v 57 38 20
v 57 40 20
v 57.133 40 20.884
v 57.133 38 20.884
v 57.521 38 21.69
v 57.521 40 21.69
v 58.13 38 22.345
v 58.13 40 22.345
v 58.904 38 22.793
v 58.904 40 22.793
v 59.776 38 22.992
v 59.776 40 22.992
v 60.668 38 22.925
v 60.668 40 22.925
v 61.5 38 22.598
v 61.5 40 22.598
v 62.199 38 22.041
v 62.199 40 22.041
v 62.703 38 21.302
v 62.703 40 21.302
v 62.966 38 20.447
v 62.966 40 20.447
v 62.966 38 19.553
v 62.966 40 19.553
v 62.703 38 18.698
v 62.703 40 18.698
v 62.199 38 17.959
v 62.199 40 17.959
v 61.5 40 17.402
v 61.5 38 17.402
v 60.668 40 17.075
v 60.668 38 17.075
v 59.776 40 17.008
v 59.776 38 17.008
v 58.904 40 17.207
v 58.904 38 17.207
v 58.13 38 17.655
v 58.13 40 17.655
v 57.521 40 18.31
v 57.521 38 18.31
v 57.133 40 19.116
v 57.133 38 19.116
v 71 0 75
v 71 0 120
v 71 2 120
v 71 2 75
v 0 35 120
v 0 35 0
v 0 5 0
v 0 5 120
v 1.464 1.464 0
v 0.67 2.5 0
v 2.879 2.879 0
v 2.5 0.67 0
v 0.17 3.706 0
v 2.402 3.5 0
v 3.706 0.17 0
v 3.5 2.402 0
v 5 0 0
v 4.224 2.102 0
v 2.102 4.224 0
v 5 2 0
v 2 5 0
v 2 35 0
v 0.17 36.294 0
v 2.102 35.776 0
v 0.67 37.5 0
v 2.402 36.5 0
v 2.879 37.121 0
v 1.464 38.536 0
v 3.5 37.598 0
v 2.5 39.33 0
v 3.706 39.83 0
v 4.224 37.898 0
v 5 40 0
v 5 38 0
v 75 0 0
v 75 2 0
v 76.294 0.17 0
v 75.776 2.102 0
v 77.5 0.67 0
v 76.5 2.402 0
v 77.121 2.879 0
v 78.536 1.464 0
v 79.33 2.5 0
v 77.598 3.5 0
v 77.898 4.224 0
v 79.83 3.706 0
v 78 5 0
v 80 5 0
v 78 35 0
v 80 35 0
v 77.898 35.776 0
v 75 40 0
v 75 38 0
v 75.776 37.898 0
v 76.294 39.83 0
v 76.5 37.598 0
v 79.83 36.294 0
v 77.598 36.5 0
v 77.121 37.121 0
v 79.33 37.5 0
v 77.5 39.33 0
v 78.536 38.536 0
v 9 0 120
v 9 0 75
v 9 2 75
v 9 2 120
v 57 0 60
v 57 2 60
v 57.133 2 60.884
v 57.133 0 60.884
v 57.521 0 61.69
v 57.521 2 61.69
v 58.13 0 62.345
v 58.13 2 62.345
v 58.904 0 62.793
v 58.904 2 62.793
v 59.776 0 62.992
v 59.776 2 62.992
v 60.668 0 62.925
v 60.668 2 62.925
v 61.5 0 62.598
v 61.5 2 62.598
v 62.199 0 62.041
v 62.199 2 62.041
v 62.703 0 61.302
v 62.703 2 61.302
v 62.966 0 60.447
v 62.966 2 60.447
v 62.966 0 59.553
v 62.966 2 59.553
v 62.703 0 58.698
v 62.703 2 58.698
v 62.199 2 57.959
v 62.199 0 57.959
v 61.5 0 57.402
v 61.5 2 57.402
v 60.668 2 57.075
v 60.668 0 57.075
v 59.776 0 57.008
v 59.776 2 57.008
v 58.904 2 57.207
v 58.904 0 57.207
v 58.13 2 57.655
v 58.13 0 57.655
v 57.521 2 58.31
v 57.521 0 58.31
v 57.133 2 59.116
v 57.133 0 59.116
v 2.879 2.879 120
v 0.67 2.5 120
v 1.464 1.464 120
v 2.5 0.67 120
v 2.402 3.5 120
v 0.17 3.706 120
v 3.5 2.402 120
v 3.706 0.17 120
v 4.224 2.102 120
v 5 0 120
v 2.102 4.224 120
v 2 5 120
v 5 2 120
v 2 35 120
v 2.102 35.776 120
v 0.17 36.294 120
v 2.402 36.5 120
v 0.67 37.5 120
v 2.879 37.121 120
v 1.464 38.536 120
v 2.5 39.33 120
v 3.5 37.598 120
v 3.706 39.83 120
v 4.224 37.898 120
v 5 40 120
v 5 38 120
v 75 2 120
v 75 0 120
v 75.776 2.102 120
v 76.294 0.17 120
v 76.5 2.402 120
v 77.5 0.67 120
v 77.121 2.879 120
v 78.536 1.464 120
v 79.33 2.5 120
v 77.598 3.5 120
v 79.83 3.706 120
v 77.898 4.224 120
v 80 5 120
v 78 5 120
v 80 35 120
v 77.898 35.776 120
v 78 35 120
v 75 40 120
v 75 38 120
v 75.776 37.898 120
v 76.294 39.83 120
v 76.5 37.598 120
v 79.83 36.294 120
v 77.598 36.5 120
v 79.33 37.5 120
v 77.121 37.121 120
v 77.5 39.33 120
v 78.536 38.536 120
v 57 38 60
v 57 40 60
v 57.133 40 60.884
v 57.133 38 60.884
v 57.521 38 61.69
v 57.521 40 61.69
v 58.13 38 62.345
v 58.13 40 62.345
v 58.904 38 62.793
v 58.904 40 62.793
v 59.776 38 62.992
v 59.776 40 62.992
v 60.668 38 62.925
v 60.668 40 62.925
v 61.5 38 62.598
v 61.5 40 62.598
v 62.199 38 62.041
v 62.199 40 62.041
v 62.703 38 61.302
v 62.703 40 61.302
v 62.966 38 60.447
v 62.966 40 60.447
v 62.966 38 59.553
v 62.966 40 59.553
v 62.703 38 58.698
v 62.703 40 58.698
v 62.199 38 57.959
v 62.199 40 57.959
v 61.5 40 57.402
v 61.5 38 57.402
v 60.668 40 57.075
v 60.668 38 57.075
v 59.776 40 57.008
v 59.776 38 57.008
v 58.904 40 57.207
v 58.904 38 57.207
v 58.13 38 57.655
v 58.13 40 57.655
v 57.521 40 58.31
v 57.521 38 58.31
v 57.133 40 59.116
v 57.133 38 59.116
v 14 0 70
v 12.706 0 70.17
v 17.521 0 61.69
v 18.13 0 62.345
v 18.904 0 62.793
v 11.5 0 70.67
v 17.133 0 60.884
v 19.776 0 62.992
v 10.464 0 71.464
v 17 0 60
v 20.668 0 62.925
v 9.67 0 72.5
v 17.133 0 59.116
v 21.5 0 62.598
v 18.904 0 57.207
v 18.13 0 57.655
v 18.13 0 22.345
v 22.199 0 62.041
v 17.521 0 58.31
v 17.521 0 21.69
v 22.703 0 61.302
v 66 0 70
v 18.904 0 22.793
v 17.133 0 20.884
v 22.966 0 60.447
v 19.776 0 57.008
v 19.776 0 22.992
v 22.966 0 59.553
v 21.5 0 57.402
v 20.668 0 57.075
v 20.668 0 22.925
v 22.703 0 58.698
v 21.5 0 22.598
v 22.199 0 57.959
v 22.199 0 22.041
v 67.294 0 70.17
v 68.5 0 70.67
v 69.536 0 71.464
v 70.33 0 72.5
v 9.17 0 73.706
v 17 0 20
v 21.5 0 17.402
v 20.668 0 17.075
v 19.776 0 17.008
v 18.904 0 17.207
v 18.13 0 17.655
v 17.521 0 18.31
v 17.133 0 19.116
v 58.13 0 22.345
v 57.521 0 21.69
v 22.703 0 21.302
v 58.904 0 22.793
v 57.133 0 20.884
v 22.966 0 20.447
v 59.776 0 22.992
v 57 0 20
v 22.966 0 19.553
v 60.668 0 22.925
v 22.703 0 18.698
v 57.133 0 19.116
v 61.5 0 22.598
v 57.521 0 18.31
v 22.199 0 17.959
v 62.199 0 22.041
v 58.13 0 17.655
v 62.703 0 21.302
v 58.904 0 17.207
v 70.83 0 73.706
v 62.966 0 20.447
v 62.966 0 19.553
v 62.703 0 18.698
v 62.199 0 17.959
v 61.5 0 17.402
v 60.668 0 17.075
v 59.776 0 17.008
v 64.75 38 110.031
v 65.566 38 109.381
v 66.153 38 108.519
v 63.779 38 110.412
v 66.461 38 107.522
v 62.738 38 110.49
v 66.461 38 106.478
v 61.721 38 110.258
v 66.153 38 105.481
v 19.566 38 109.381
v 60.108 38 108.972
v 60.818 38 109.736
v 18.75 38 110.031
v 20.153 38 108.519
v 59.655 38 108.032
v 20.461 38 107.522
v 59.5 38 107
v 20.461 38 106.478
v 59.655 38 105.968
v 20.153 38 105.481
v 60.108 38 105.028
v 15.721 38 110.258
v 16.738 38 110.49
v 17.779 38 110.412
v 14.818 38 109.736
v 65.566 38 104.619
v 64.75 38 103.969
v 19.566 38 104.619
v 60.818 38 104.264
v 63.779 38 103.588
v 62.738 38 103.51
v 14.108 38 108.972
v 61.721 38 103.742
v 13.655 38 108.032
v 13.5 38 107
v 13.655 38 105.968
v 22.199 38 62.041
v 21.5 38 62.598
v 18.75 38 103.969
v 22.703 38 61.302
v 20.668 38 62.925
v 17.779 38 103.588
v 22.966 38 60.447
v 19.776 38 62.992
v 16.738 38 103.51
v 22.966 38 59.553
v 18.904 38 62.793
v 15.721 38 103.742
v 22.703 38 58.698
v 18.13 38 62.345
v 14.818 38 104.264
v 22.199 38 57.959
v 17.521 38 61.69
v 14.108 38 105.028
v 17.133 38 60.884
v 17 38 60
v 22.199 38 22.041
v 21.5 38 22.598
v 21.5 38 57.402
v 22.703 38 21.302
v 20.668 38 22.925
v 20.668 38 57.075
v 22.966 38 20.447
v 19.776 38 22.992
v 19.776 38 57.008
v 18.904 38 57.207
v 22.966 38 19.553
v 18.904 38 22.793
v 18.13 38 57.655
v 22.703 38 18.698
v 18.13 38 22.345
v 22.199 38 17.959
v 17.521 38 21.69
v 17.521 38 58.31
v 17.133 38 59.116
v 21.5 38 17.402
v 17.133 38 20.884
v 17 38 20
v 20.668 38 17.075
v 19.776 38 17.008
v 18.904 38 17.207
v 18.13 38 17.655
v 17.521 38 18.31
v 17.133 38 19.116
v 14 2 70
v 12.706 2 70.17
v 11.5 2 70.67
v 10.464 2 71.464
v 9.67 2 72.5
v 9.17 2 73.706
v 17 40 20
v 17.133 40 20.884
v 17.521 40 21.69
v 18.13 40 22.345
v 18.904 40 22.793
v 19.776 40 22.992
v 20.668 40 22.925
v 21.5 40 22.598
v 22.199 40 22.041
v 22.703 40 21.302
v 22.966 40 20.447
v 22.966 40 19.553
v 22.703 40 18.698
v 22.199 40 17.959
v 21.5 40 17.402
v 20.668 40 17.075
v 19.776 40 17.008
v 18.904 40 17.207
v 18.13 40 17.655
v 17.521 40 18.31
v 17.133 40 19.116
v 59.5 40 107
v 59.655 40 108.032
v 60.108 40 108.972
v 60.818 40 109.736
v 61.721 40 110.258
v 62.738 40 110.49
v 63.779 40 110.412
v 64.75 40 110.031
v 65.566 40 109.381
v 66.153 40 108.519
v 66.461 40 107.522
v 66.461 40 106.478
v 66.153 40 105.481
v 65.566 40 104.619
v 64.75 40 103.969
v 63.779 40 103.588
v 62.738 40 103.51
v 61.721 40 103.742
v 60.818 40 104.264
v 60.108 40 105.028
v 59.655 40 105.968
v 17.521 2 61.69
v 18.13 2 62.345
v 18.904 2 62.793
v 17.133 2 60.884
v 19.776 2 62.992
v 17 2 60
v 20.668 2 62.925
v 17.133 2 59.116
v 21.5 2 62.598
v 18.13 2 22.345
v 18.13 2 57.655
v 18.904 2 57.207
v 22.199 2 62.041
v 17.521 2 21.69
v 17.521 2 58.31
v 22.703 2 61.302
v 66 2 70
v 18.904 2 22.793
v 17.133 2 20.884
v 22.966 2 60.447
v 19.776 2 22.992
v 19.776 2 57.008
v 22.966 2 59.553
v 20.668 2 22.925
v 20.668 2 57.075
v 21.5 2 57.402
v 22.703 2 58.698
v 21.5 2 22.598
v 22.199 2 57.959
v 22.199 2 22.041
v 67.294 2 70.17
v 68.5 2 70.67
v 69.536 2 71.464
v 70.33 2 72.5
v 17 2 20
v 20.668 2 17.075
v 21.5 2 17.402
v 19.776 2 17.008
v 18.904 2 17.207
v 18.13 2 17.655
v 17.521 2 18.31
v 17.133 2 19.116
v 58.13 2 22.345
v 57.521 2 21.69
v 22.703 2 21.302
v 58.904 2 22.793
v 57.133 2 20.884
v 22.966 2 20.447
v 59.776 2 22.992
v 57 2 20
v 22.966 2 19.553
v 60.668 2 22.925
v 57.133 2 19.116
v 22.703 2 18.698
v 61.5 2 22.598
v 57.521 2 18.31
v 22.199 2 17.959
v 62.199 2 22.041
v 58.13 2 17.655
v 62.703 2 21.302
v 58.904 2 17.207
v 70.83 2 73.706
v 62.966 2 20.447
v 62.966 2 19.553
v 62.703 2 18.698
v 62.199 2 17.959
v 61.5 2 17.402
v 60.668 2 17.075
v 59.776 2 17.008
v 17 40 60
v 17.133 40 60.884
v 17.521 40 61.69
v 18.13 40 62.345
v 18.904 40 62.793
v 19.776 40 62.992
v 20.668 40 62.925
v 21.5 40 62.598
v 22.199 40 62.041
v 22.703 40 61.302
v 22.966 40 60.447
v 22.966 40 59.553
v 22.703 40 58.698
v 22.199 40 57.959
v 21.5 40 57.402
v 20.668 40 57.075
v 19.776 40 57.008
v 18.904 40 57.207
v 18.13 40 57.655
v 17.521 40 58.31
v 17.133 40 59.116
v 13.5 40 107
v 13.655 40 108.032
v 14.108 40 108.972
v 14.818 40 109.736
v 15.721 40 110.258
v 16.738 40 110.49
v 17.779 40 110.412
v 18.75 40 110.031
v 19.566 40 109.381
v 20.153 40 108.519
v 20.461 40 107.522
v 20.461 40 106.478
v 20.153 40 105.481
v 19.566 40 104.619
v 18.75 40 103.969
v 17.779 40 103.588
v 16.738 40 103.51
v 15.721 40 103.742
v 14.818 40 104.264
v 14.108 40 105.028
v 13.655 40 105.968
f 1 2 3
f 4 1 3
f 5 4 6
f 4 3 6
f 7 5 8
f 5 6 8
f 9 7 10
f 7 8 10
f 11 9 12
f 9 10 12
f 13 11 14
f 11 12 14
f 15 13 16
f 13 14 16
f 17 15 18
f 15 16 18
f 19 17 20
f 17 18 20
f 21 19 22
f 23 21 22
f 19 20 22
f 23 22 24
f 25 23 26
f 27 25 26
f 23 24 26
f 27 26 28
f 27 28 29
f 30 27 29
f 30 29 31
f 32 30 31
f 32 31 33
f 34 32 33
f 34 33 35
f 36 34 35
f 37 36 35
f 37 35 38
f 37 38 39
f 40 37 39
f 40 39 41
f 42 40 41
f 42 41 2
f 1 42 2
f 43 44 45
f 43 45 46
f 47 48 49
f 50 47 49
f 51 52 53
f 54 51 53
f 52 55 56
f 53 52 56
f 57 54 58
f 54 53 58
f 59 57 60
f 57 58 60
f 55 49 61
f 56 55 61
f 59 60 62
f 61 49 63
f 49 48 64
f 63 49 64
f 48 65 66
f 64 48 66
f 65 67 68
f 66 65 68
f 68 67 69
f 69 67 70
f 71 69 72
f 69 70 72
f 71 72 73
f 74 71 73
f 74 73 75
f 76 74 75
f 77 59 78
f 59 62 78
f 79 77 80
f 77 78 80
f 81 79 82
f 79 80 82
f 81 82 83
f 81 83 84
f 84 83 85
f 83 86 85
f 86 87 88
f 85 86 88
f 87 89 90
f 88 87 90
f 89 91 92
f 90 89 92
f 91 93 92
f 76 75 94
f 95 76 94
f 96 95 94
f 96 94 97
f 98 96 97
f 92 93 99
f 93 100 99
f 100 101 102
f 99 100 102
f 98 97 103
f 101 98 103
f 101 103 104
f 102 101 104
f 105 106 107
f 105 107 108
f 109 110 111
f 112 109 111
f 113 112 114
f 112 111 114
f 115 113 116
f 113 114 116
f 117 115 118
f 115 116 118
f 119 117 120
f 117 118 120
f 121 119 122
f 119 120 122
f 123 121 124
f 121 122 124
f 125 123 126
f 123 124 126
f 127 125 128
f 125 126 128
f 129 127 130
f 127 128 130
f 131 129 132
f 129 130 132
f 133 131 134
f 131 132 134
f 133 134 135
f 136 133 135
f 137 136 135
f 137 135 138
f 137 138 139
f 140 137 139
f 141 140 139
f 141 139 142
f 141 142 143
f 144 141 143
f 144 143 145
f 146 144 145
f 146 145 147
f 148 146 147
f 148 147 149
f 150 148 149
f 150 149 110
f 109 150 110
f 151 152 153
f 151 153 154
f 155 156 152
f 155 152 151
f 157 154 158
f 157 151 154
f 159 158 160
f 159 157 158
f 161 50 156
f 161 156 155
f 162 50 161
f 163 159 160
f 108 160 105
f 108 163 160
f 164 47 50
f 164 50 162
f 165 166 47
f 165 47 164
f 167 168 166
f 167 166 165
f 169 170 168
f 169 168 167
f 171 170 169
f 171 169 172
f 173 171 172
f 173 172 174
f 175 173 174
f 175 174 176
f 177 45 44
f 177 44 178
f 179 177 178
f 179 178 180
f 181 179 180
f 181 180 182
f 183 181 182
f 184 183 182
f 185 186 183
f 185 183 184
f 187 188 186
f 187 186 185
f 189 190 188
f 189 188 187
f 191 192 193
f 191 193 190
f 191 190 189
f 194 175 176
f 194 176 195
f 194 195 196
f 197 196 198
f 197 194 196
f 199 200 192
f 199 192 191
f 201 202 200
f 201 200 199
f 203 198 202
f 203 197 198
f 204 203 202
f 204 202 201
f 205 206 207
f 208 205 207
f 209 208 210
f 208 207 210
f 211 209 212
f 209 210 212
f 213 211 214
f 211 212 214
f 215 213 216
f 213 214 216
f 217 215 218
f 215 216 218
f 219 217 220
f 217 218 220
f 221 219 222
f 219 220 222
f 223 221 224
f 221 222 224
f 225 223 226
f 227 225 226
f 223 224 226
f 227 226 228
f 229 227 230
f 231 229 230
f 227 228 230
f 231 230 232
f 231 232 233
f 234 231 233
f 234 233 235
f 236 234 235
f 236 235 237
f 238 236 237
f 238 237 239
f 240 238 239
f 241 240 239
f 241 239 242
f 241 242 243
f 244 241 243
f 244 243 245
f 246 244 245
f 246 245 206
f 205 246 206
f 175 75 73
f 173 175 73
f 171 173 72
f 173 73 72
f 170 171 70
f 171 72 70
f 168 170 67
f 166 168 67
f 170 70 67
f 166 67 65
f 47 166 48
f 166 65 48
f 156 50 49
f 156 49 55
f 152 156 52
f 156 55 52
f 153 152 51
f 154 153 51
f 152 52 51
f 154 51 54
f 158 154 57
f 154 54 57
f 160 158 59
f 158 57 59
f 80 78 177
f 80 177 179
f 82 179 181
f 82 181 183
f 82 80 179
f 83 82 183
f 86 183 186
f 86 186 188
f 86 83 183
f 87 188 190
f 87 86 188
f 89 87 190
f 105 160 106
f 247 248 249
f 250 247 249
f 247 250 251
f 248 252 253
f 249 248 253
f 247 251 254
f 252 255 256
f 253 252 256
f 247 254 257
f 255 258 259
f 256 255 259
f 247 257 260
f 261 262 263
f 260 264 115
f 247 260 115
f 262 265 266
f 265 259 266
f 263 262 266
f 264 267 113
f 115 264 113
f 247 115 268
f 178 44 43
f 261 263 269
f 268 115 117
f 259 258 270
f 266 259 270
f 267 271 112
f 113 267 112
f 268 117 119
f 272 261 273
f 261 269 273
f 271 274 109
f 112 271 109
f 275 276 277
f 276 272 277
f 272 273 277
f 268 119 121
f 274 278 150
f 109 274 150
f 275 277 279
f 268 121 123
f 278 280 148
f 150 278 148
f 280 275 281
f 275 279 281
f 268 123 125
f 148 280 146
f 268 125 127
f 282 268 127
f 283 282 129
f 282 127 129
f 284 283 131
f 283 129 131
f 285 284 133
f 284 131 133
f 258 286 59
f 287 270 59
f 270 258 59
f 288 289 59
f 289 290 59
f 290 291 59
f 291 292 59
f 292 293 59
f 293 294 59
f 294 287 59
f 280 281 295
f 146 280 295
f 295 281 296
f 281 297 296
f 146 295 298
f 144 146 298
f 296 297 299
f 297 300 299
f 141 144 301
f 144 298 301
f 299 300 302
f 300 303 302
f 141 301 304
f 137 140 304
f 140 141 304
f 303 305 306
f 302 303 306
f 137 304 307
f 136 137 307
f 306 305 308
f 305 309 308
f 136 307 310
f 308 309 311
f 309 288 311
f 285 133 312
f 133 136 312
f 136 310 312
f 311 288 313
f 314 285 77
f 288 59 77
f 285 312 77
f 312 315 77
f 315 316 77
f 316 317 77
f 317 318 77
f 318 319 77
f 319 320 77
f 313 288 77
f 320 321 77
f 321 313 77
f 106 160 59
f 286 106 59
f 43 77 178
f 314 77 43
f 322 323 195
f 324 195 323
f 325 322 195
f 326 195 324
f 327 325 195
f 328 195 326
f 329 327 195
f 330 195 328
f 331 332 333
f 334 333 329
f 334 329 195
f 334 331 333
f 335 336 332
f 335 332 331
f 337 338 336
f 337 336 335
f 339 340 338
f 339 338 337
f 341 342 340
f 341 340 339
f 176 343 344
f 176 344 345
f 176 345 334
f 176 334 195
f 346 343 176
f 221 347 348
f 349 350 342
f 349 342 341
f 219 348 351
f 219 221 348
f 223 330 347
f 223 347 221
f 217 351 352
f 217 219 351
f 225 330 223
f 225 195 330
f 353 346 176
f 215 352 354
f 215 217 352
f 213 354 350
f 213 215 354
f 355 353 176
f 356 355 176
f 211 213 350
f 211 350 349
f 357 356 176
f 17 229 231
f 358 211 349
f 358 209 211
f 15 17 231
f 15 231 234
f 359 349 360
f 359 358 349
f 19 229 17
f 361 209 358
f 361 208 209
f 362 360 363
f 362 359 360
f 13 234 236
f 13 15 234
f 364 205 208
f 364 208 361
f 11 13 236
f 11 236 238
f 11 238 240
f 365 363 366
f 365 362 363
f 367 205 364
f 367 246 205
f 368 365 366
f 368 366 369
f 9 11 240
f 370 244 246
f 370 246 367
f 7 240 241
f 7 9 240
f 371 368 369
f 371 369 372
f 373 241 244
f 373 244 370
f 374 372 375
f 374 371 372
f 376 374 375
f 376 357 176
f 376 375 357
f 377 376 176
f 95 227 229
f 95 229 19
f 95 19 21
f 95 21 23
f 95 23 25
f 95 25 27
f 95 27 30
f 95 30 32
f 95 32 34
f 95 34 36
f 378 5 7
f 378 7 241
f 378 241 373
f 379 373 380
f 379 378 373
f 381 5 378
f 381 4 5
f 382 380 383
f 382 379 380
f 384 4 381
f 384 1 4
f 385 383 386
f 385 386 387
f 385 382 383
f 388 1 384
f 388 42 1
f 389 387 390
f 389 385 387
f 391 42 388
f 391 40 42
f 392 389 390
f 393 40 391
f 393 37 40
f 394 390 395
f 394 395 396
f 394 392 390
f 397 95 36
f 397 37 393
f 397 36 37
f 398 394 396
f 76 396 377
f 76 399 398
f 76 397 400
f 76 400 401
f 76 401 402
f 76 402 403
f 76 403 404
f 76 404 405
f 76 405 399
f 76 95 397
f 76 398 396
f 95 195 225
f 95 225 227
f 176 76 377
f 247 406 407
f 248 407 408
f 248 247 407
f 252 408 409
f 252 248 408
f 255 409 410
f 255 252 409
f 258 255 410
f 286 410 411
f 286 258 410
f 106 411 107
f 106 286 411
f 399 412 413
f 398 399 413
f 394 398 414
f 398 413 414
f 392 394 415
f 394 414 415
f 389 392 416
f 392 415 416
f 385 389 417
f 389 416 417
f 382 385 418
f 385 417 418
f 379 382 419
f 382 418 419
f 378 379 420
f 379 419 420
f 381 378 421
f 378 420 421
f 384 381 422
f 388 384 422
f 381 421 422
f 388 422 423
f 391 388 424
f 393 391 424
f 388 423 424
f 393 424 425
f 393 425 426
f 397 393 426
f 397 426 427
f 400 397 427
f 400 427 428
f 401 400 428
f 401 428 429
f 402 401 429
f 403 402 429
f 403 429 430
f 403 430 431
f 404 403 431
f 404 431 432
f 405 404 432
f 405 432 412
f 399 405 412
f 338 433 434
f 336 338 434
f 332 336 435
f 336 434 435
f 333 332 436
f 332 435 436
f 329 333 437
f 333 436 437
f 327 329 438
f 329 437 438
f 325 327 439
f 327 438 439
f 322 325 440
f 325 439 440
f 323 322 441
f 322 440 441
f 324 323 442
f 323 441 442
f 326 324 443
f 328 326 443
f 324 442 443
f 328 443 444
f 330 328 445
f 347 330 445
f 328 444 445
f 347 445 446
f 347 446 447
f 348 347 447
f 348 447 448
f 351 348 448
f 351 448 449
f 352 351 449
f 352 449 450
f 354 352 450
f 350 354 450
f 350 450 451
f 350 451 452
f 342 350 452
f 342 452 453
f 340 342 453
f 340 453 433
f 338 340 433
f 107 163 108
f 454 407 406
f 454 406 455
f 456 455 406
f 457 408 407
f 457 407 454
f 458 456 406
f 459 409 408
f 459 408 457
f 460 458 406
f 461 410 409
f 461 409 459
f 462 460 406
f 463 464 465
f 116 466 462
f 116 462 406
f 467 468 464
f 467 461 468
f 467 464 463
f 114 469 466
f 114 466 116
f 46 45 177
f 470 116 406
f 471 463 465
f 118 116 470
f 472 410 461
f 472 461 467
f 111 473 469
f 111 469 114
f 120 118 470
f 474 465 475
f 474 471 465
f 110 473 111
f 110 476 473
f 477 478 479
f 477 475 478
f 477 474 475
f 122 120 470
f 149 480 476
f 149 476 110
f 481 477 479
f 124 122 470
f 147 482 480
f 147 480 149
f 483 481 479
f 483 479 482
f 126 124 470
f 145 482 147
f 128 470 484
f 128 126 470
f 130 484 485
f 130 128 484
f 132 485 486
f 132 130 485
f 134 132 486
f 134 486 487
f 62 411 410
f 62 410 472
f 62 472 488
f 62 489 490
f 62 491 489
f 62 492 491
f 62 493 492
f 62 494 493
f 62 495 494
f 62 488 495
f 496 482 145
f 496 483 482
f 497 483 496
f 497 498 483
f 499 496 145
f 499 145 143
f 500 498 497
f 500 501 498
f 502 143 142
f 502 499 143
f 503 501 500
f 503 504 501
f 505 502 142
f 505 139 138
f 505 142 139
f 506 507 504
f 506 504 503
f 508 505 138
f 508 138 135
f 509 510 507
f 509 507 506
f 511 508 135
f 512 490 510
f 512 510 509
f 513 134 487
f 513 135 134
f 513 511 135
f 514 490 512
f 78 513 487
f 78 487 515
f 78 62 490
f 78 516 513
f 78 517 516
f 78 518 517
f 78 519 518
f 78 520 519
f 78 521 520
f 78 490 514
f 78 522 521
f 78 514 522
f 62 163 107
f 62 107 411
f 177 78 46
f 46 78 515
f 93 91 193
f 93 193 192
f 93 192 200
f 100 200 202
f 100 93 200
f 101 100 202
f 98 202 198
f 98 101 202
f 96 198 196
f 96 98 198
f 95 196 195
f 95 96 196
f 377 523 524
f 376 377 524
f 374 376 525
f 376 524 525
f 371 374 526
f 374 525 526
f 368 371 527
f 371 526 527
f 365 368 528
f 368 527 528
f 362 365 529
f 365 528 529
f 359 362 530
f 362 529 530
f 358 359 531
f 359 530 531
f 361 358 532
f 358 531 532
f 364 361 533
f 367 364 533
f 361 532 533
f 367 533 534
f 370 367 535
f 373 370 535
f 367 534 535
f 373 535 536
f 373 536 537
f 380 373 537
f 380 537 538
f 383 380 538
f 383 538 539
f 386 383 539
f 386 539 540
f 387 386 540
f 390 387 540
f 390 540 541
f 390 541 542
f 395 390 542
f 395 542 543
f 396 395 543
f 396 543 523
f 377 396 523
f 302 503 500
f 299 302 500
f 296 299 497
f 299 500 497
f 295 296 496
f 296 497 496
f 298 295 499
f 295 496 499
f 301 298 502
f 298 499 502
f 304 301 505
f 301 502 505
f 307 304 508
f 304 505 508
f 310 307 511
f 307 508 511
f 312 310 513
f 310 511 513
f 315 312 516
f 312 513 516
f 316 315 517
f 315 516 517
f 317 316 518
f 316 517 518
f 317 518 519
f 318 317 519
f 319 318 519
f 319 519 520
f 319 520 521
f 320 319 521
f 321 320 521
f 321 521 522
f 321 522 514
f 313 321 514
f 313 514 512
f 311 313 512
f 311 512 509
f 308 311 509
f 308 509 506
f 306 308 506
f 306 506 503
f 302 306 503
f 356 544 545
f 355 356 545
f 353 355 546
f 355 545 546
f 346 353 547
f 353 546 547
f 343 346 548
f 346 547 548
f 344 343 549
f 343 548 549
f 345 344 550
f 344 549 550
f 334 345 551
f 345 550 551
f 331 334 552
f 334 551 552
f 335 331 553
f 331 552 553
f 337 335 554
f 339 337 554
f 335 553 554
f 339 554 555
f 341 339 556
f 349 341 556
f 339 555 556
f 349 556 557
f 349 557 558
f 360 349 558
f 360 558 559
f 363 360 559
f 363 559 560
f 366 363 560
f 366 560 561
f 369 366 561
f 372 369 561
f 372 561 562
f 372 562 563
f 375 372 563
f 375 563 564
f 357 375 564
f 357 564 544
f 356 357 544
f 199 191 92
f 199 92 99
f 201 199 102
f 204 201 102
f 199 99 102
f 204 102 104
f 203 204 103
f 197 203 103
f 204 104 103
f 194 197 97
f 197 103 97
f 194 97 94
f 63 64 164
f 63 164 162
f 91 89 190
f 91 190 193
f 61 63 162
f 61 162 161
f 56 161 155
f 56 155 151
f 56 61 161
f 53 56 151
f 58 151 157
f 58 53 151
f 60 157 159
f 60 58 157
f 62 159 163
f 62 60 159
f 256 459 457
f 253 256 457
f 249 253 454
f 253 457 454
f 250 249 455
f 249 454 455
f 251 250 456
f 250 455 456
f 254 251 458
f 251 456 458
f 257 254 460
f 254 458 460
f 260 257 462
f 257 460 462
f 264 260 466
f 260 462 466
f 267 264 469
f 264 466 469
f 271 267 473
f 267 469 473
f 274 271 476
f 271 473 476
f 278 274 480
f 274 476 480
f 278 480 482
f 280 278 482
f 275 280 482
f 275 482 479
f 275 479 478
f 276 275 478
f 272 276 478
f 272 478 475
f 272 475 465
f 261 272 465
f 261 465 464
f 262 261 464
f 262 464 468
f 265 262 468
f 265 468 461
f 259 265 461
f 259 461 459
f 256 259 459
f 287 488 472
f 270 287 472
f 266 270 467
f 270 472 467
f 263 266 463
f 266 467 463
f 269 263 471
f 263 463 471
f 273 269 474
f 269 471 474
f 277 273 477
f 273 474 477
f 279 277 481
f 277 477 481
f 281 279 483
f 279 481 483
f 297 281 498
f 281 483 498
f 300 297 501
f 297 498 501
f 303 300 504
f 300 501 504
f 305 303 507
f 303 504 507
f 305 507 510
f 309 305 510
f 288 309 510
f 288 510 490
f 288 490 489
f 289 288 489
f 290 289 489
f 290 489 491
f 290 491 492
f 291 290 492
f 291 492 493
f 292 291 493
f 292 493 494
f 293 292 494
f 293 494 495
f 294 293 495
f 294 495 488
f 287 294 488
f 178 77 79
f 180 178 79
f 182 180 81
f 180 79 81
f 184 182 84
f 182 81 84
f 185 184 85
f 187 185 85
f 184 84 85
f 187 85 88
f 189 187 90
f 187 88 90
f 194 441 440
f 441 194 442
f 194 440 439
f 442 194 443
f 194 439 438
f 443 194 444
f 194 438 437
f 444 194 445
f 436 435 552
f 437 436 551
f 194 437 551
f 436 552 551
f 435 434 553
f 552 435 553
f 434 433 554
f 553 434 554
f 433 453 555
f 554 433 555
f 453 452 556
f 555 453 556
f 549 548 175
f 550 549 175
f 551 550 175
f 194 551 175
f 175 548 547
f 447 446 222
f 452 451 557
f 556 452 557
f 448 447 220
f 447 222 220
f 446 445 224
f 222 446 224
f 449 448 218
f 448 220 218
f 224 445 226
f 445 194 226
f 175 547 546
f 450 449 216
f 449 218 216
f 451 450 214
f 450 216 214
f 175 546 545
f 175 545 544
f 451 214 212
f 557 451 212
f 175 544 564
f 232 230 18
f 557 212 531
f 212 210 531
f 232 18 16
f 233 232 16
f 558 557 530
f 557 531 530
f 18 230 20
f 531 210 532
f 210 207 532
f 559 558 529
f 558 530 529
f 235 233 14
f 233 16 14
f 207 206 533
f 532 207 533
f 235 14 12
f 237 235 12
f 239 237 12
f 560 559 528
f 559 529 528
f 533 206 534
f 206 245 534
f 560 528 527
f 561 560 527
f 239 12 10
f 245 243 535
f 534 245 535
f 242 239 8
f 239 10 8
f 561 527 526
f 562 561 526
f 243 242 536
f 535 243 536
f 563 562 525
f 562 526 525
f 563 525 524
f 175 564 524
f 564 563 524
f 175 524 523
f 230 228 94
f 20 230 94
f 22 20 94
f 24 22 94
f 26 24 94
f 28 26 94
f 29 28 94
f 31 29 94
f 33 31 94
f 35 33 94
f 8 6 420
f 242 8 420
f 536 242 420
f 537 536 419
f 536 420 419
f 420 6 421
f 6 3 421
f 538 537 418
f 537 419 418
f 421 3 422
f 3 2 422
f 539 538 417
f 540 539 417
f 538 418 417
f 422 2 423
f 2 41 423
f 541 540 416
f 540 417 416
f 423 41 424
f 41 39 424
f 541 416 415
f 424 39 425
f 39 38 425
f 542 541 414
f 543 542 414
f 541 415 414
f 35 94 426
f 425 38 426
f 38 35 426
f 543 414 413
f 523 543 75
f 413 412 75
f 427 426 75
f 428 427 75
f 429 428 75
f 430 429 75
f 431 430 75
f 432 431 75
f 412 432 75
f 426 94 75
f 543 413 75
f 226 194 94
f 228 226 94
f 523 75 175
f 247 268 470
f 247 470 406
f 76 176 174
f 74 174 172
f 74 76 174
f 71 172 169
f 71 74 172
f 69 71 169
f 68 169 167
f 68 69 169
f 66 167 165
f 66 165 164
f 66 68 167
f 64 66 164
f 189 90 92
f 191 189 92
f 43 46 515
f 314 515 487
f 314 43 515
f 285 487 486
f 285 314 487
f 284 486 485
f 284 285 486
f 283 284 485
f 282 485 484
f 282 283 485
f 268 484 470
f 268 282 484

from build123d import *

# Parameters (mm, degrees)
AUFSATZ_LINEAR_AUSTRAGEN1_DEPTH = 120
SCHNITT_LINEAR_AUSTRAGEN1_DEPTH = 10
SKIZZE3_R                       = 3
SKIZZE3_R_2                     = 3.5
SCHNITT_LINEAR_AUSTRAGEN2_DEPTH = 60


with BuildPart() as part:
    # Skizze1 → Aufsatz-Linear austragen1 (new body)
    with BuildSketch(Plane.XY):
        with BuildLine():
            Line((0, 35), (0, 5))
            ThreePointArc((0, 5), (1.464466094, 1.464466094), (5, 0))
            Line((5, 0), (75, 0))
            ThreePointArc((75, 0), (78.535533906, 1.464466094), (80, 5))
            Line((80, 5), (80, 35))
            ThreePointArc((80, 35), (78.535533906, 38.535533906), (75, 40))
            Line((75, 40), (5, 40))
            ThreePointArc((5, 40), (1.464466094, 38.535533906), (0, 35))
        make_face()
        with BuildLine():
            Line((78, 5), (78, 35))
            ThreePointArc((78, 35), (77.121320344, 37.121320344), (75, 38))
            Line((75, 38), (5, 38))
            ThreePointArc((5, 38), (2.878679656, 37.121320344), (2, 35))
            Line((2, 35), (2, 5))
            ThreePointArc((2, 5), (2.878679656, 2.878679656), (5, 2))
            Line((5, 2), (75, 2))
            ThreePointArc((75, 2), (77.121320344, 2.878679656), (78, 5))
        make_face(mode=Mode.SUBTRACT)
    extrude(amount=AUFSATZ_LINEAR_AUSTRAGEN1_DEPTH)

    # Skizze2 → Schnitt-Linear austragen1 (cut)
    with BuildSketch(Plane.XZ):
        with BuildLine():
            Line((9, 120), (71, 120))
            Line((71, 120), (71, 75))
            ThreePointArc((71, 75), (69.535533906, 71.464466094), (66, 70))
            Line((66, 70), (14, 70))
            ThreePointArc((14, 70), (10.464466094, 71.464466094), (9, 75))
            Line((9, 75), (9, 120))
        make_face()
    extrude(amount=-SCHNITT_LINEAR_AUSTRAGEN1_DEPTH, mode=Mode.SUBTRACT)

    # Skizze3 → Schnitt-Linear austragen2 (cut)
    with BuildSketch(Plane(origin=(0, 40, 0), x_dir=(1, 0, 0), z_dir=(0, 1, 0))):
        with Locations(Location((60, -20, 0), (0, 0, 180))):
            Circle(SKIZZE3_R)
        with Locations(Location((20, -20, 0), (0, 0, 180))):
            Circle(SKIZZE3_R)
        with Locations(Location((60, -60, 0), (0, 0, 180))):
            Circle(SKIZZE3_R)
        with Locations(Location((20, -60, 0), (0, 0, 180))):
            Circle(SKIZZE3_R)
        with Locations(Location((63, -107, 0), (0, 0, 180))):
            Circle(SKIZZE3_R_2)
        with Locations(Location((17, -107, 0), (0, 0, 180))):
            Circle(SKIZZE3_R_2)
    extrude(amount=-SCHNITT_LINEAR_AUSTRAGEN2_DEPTH, mode=Mode.SUBTRACT)


solid = part.part
